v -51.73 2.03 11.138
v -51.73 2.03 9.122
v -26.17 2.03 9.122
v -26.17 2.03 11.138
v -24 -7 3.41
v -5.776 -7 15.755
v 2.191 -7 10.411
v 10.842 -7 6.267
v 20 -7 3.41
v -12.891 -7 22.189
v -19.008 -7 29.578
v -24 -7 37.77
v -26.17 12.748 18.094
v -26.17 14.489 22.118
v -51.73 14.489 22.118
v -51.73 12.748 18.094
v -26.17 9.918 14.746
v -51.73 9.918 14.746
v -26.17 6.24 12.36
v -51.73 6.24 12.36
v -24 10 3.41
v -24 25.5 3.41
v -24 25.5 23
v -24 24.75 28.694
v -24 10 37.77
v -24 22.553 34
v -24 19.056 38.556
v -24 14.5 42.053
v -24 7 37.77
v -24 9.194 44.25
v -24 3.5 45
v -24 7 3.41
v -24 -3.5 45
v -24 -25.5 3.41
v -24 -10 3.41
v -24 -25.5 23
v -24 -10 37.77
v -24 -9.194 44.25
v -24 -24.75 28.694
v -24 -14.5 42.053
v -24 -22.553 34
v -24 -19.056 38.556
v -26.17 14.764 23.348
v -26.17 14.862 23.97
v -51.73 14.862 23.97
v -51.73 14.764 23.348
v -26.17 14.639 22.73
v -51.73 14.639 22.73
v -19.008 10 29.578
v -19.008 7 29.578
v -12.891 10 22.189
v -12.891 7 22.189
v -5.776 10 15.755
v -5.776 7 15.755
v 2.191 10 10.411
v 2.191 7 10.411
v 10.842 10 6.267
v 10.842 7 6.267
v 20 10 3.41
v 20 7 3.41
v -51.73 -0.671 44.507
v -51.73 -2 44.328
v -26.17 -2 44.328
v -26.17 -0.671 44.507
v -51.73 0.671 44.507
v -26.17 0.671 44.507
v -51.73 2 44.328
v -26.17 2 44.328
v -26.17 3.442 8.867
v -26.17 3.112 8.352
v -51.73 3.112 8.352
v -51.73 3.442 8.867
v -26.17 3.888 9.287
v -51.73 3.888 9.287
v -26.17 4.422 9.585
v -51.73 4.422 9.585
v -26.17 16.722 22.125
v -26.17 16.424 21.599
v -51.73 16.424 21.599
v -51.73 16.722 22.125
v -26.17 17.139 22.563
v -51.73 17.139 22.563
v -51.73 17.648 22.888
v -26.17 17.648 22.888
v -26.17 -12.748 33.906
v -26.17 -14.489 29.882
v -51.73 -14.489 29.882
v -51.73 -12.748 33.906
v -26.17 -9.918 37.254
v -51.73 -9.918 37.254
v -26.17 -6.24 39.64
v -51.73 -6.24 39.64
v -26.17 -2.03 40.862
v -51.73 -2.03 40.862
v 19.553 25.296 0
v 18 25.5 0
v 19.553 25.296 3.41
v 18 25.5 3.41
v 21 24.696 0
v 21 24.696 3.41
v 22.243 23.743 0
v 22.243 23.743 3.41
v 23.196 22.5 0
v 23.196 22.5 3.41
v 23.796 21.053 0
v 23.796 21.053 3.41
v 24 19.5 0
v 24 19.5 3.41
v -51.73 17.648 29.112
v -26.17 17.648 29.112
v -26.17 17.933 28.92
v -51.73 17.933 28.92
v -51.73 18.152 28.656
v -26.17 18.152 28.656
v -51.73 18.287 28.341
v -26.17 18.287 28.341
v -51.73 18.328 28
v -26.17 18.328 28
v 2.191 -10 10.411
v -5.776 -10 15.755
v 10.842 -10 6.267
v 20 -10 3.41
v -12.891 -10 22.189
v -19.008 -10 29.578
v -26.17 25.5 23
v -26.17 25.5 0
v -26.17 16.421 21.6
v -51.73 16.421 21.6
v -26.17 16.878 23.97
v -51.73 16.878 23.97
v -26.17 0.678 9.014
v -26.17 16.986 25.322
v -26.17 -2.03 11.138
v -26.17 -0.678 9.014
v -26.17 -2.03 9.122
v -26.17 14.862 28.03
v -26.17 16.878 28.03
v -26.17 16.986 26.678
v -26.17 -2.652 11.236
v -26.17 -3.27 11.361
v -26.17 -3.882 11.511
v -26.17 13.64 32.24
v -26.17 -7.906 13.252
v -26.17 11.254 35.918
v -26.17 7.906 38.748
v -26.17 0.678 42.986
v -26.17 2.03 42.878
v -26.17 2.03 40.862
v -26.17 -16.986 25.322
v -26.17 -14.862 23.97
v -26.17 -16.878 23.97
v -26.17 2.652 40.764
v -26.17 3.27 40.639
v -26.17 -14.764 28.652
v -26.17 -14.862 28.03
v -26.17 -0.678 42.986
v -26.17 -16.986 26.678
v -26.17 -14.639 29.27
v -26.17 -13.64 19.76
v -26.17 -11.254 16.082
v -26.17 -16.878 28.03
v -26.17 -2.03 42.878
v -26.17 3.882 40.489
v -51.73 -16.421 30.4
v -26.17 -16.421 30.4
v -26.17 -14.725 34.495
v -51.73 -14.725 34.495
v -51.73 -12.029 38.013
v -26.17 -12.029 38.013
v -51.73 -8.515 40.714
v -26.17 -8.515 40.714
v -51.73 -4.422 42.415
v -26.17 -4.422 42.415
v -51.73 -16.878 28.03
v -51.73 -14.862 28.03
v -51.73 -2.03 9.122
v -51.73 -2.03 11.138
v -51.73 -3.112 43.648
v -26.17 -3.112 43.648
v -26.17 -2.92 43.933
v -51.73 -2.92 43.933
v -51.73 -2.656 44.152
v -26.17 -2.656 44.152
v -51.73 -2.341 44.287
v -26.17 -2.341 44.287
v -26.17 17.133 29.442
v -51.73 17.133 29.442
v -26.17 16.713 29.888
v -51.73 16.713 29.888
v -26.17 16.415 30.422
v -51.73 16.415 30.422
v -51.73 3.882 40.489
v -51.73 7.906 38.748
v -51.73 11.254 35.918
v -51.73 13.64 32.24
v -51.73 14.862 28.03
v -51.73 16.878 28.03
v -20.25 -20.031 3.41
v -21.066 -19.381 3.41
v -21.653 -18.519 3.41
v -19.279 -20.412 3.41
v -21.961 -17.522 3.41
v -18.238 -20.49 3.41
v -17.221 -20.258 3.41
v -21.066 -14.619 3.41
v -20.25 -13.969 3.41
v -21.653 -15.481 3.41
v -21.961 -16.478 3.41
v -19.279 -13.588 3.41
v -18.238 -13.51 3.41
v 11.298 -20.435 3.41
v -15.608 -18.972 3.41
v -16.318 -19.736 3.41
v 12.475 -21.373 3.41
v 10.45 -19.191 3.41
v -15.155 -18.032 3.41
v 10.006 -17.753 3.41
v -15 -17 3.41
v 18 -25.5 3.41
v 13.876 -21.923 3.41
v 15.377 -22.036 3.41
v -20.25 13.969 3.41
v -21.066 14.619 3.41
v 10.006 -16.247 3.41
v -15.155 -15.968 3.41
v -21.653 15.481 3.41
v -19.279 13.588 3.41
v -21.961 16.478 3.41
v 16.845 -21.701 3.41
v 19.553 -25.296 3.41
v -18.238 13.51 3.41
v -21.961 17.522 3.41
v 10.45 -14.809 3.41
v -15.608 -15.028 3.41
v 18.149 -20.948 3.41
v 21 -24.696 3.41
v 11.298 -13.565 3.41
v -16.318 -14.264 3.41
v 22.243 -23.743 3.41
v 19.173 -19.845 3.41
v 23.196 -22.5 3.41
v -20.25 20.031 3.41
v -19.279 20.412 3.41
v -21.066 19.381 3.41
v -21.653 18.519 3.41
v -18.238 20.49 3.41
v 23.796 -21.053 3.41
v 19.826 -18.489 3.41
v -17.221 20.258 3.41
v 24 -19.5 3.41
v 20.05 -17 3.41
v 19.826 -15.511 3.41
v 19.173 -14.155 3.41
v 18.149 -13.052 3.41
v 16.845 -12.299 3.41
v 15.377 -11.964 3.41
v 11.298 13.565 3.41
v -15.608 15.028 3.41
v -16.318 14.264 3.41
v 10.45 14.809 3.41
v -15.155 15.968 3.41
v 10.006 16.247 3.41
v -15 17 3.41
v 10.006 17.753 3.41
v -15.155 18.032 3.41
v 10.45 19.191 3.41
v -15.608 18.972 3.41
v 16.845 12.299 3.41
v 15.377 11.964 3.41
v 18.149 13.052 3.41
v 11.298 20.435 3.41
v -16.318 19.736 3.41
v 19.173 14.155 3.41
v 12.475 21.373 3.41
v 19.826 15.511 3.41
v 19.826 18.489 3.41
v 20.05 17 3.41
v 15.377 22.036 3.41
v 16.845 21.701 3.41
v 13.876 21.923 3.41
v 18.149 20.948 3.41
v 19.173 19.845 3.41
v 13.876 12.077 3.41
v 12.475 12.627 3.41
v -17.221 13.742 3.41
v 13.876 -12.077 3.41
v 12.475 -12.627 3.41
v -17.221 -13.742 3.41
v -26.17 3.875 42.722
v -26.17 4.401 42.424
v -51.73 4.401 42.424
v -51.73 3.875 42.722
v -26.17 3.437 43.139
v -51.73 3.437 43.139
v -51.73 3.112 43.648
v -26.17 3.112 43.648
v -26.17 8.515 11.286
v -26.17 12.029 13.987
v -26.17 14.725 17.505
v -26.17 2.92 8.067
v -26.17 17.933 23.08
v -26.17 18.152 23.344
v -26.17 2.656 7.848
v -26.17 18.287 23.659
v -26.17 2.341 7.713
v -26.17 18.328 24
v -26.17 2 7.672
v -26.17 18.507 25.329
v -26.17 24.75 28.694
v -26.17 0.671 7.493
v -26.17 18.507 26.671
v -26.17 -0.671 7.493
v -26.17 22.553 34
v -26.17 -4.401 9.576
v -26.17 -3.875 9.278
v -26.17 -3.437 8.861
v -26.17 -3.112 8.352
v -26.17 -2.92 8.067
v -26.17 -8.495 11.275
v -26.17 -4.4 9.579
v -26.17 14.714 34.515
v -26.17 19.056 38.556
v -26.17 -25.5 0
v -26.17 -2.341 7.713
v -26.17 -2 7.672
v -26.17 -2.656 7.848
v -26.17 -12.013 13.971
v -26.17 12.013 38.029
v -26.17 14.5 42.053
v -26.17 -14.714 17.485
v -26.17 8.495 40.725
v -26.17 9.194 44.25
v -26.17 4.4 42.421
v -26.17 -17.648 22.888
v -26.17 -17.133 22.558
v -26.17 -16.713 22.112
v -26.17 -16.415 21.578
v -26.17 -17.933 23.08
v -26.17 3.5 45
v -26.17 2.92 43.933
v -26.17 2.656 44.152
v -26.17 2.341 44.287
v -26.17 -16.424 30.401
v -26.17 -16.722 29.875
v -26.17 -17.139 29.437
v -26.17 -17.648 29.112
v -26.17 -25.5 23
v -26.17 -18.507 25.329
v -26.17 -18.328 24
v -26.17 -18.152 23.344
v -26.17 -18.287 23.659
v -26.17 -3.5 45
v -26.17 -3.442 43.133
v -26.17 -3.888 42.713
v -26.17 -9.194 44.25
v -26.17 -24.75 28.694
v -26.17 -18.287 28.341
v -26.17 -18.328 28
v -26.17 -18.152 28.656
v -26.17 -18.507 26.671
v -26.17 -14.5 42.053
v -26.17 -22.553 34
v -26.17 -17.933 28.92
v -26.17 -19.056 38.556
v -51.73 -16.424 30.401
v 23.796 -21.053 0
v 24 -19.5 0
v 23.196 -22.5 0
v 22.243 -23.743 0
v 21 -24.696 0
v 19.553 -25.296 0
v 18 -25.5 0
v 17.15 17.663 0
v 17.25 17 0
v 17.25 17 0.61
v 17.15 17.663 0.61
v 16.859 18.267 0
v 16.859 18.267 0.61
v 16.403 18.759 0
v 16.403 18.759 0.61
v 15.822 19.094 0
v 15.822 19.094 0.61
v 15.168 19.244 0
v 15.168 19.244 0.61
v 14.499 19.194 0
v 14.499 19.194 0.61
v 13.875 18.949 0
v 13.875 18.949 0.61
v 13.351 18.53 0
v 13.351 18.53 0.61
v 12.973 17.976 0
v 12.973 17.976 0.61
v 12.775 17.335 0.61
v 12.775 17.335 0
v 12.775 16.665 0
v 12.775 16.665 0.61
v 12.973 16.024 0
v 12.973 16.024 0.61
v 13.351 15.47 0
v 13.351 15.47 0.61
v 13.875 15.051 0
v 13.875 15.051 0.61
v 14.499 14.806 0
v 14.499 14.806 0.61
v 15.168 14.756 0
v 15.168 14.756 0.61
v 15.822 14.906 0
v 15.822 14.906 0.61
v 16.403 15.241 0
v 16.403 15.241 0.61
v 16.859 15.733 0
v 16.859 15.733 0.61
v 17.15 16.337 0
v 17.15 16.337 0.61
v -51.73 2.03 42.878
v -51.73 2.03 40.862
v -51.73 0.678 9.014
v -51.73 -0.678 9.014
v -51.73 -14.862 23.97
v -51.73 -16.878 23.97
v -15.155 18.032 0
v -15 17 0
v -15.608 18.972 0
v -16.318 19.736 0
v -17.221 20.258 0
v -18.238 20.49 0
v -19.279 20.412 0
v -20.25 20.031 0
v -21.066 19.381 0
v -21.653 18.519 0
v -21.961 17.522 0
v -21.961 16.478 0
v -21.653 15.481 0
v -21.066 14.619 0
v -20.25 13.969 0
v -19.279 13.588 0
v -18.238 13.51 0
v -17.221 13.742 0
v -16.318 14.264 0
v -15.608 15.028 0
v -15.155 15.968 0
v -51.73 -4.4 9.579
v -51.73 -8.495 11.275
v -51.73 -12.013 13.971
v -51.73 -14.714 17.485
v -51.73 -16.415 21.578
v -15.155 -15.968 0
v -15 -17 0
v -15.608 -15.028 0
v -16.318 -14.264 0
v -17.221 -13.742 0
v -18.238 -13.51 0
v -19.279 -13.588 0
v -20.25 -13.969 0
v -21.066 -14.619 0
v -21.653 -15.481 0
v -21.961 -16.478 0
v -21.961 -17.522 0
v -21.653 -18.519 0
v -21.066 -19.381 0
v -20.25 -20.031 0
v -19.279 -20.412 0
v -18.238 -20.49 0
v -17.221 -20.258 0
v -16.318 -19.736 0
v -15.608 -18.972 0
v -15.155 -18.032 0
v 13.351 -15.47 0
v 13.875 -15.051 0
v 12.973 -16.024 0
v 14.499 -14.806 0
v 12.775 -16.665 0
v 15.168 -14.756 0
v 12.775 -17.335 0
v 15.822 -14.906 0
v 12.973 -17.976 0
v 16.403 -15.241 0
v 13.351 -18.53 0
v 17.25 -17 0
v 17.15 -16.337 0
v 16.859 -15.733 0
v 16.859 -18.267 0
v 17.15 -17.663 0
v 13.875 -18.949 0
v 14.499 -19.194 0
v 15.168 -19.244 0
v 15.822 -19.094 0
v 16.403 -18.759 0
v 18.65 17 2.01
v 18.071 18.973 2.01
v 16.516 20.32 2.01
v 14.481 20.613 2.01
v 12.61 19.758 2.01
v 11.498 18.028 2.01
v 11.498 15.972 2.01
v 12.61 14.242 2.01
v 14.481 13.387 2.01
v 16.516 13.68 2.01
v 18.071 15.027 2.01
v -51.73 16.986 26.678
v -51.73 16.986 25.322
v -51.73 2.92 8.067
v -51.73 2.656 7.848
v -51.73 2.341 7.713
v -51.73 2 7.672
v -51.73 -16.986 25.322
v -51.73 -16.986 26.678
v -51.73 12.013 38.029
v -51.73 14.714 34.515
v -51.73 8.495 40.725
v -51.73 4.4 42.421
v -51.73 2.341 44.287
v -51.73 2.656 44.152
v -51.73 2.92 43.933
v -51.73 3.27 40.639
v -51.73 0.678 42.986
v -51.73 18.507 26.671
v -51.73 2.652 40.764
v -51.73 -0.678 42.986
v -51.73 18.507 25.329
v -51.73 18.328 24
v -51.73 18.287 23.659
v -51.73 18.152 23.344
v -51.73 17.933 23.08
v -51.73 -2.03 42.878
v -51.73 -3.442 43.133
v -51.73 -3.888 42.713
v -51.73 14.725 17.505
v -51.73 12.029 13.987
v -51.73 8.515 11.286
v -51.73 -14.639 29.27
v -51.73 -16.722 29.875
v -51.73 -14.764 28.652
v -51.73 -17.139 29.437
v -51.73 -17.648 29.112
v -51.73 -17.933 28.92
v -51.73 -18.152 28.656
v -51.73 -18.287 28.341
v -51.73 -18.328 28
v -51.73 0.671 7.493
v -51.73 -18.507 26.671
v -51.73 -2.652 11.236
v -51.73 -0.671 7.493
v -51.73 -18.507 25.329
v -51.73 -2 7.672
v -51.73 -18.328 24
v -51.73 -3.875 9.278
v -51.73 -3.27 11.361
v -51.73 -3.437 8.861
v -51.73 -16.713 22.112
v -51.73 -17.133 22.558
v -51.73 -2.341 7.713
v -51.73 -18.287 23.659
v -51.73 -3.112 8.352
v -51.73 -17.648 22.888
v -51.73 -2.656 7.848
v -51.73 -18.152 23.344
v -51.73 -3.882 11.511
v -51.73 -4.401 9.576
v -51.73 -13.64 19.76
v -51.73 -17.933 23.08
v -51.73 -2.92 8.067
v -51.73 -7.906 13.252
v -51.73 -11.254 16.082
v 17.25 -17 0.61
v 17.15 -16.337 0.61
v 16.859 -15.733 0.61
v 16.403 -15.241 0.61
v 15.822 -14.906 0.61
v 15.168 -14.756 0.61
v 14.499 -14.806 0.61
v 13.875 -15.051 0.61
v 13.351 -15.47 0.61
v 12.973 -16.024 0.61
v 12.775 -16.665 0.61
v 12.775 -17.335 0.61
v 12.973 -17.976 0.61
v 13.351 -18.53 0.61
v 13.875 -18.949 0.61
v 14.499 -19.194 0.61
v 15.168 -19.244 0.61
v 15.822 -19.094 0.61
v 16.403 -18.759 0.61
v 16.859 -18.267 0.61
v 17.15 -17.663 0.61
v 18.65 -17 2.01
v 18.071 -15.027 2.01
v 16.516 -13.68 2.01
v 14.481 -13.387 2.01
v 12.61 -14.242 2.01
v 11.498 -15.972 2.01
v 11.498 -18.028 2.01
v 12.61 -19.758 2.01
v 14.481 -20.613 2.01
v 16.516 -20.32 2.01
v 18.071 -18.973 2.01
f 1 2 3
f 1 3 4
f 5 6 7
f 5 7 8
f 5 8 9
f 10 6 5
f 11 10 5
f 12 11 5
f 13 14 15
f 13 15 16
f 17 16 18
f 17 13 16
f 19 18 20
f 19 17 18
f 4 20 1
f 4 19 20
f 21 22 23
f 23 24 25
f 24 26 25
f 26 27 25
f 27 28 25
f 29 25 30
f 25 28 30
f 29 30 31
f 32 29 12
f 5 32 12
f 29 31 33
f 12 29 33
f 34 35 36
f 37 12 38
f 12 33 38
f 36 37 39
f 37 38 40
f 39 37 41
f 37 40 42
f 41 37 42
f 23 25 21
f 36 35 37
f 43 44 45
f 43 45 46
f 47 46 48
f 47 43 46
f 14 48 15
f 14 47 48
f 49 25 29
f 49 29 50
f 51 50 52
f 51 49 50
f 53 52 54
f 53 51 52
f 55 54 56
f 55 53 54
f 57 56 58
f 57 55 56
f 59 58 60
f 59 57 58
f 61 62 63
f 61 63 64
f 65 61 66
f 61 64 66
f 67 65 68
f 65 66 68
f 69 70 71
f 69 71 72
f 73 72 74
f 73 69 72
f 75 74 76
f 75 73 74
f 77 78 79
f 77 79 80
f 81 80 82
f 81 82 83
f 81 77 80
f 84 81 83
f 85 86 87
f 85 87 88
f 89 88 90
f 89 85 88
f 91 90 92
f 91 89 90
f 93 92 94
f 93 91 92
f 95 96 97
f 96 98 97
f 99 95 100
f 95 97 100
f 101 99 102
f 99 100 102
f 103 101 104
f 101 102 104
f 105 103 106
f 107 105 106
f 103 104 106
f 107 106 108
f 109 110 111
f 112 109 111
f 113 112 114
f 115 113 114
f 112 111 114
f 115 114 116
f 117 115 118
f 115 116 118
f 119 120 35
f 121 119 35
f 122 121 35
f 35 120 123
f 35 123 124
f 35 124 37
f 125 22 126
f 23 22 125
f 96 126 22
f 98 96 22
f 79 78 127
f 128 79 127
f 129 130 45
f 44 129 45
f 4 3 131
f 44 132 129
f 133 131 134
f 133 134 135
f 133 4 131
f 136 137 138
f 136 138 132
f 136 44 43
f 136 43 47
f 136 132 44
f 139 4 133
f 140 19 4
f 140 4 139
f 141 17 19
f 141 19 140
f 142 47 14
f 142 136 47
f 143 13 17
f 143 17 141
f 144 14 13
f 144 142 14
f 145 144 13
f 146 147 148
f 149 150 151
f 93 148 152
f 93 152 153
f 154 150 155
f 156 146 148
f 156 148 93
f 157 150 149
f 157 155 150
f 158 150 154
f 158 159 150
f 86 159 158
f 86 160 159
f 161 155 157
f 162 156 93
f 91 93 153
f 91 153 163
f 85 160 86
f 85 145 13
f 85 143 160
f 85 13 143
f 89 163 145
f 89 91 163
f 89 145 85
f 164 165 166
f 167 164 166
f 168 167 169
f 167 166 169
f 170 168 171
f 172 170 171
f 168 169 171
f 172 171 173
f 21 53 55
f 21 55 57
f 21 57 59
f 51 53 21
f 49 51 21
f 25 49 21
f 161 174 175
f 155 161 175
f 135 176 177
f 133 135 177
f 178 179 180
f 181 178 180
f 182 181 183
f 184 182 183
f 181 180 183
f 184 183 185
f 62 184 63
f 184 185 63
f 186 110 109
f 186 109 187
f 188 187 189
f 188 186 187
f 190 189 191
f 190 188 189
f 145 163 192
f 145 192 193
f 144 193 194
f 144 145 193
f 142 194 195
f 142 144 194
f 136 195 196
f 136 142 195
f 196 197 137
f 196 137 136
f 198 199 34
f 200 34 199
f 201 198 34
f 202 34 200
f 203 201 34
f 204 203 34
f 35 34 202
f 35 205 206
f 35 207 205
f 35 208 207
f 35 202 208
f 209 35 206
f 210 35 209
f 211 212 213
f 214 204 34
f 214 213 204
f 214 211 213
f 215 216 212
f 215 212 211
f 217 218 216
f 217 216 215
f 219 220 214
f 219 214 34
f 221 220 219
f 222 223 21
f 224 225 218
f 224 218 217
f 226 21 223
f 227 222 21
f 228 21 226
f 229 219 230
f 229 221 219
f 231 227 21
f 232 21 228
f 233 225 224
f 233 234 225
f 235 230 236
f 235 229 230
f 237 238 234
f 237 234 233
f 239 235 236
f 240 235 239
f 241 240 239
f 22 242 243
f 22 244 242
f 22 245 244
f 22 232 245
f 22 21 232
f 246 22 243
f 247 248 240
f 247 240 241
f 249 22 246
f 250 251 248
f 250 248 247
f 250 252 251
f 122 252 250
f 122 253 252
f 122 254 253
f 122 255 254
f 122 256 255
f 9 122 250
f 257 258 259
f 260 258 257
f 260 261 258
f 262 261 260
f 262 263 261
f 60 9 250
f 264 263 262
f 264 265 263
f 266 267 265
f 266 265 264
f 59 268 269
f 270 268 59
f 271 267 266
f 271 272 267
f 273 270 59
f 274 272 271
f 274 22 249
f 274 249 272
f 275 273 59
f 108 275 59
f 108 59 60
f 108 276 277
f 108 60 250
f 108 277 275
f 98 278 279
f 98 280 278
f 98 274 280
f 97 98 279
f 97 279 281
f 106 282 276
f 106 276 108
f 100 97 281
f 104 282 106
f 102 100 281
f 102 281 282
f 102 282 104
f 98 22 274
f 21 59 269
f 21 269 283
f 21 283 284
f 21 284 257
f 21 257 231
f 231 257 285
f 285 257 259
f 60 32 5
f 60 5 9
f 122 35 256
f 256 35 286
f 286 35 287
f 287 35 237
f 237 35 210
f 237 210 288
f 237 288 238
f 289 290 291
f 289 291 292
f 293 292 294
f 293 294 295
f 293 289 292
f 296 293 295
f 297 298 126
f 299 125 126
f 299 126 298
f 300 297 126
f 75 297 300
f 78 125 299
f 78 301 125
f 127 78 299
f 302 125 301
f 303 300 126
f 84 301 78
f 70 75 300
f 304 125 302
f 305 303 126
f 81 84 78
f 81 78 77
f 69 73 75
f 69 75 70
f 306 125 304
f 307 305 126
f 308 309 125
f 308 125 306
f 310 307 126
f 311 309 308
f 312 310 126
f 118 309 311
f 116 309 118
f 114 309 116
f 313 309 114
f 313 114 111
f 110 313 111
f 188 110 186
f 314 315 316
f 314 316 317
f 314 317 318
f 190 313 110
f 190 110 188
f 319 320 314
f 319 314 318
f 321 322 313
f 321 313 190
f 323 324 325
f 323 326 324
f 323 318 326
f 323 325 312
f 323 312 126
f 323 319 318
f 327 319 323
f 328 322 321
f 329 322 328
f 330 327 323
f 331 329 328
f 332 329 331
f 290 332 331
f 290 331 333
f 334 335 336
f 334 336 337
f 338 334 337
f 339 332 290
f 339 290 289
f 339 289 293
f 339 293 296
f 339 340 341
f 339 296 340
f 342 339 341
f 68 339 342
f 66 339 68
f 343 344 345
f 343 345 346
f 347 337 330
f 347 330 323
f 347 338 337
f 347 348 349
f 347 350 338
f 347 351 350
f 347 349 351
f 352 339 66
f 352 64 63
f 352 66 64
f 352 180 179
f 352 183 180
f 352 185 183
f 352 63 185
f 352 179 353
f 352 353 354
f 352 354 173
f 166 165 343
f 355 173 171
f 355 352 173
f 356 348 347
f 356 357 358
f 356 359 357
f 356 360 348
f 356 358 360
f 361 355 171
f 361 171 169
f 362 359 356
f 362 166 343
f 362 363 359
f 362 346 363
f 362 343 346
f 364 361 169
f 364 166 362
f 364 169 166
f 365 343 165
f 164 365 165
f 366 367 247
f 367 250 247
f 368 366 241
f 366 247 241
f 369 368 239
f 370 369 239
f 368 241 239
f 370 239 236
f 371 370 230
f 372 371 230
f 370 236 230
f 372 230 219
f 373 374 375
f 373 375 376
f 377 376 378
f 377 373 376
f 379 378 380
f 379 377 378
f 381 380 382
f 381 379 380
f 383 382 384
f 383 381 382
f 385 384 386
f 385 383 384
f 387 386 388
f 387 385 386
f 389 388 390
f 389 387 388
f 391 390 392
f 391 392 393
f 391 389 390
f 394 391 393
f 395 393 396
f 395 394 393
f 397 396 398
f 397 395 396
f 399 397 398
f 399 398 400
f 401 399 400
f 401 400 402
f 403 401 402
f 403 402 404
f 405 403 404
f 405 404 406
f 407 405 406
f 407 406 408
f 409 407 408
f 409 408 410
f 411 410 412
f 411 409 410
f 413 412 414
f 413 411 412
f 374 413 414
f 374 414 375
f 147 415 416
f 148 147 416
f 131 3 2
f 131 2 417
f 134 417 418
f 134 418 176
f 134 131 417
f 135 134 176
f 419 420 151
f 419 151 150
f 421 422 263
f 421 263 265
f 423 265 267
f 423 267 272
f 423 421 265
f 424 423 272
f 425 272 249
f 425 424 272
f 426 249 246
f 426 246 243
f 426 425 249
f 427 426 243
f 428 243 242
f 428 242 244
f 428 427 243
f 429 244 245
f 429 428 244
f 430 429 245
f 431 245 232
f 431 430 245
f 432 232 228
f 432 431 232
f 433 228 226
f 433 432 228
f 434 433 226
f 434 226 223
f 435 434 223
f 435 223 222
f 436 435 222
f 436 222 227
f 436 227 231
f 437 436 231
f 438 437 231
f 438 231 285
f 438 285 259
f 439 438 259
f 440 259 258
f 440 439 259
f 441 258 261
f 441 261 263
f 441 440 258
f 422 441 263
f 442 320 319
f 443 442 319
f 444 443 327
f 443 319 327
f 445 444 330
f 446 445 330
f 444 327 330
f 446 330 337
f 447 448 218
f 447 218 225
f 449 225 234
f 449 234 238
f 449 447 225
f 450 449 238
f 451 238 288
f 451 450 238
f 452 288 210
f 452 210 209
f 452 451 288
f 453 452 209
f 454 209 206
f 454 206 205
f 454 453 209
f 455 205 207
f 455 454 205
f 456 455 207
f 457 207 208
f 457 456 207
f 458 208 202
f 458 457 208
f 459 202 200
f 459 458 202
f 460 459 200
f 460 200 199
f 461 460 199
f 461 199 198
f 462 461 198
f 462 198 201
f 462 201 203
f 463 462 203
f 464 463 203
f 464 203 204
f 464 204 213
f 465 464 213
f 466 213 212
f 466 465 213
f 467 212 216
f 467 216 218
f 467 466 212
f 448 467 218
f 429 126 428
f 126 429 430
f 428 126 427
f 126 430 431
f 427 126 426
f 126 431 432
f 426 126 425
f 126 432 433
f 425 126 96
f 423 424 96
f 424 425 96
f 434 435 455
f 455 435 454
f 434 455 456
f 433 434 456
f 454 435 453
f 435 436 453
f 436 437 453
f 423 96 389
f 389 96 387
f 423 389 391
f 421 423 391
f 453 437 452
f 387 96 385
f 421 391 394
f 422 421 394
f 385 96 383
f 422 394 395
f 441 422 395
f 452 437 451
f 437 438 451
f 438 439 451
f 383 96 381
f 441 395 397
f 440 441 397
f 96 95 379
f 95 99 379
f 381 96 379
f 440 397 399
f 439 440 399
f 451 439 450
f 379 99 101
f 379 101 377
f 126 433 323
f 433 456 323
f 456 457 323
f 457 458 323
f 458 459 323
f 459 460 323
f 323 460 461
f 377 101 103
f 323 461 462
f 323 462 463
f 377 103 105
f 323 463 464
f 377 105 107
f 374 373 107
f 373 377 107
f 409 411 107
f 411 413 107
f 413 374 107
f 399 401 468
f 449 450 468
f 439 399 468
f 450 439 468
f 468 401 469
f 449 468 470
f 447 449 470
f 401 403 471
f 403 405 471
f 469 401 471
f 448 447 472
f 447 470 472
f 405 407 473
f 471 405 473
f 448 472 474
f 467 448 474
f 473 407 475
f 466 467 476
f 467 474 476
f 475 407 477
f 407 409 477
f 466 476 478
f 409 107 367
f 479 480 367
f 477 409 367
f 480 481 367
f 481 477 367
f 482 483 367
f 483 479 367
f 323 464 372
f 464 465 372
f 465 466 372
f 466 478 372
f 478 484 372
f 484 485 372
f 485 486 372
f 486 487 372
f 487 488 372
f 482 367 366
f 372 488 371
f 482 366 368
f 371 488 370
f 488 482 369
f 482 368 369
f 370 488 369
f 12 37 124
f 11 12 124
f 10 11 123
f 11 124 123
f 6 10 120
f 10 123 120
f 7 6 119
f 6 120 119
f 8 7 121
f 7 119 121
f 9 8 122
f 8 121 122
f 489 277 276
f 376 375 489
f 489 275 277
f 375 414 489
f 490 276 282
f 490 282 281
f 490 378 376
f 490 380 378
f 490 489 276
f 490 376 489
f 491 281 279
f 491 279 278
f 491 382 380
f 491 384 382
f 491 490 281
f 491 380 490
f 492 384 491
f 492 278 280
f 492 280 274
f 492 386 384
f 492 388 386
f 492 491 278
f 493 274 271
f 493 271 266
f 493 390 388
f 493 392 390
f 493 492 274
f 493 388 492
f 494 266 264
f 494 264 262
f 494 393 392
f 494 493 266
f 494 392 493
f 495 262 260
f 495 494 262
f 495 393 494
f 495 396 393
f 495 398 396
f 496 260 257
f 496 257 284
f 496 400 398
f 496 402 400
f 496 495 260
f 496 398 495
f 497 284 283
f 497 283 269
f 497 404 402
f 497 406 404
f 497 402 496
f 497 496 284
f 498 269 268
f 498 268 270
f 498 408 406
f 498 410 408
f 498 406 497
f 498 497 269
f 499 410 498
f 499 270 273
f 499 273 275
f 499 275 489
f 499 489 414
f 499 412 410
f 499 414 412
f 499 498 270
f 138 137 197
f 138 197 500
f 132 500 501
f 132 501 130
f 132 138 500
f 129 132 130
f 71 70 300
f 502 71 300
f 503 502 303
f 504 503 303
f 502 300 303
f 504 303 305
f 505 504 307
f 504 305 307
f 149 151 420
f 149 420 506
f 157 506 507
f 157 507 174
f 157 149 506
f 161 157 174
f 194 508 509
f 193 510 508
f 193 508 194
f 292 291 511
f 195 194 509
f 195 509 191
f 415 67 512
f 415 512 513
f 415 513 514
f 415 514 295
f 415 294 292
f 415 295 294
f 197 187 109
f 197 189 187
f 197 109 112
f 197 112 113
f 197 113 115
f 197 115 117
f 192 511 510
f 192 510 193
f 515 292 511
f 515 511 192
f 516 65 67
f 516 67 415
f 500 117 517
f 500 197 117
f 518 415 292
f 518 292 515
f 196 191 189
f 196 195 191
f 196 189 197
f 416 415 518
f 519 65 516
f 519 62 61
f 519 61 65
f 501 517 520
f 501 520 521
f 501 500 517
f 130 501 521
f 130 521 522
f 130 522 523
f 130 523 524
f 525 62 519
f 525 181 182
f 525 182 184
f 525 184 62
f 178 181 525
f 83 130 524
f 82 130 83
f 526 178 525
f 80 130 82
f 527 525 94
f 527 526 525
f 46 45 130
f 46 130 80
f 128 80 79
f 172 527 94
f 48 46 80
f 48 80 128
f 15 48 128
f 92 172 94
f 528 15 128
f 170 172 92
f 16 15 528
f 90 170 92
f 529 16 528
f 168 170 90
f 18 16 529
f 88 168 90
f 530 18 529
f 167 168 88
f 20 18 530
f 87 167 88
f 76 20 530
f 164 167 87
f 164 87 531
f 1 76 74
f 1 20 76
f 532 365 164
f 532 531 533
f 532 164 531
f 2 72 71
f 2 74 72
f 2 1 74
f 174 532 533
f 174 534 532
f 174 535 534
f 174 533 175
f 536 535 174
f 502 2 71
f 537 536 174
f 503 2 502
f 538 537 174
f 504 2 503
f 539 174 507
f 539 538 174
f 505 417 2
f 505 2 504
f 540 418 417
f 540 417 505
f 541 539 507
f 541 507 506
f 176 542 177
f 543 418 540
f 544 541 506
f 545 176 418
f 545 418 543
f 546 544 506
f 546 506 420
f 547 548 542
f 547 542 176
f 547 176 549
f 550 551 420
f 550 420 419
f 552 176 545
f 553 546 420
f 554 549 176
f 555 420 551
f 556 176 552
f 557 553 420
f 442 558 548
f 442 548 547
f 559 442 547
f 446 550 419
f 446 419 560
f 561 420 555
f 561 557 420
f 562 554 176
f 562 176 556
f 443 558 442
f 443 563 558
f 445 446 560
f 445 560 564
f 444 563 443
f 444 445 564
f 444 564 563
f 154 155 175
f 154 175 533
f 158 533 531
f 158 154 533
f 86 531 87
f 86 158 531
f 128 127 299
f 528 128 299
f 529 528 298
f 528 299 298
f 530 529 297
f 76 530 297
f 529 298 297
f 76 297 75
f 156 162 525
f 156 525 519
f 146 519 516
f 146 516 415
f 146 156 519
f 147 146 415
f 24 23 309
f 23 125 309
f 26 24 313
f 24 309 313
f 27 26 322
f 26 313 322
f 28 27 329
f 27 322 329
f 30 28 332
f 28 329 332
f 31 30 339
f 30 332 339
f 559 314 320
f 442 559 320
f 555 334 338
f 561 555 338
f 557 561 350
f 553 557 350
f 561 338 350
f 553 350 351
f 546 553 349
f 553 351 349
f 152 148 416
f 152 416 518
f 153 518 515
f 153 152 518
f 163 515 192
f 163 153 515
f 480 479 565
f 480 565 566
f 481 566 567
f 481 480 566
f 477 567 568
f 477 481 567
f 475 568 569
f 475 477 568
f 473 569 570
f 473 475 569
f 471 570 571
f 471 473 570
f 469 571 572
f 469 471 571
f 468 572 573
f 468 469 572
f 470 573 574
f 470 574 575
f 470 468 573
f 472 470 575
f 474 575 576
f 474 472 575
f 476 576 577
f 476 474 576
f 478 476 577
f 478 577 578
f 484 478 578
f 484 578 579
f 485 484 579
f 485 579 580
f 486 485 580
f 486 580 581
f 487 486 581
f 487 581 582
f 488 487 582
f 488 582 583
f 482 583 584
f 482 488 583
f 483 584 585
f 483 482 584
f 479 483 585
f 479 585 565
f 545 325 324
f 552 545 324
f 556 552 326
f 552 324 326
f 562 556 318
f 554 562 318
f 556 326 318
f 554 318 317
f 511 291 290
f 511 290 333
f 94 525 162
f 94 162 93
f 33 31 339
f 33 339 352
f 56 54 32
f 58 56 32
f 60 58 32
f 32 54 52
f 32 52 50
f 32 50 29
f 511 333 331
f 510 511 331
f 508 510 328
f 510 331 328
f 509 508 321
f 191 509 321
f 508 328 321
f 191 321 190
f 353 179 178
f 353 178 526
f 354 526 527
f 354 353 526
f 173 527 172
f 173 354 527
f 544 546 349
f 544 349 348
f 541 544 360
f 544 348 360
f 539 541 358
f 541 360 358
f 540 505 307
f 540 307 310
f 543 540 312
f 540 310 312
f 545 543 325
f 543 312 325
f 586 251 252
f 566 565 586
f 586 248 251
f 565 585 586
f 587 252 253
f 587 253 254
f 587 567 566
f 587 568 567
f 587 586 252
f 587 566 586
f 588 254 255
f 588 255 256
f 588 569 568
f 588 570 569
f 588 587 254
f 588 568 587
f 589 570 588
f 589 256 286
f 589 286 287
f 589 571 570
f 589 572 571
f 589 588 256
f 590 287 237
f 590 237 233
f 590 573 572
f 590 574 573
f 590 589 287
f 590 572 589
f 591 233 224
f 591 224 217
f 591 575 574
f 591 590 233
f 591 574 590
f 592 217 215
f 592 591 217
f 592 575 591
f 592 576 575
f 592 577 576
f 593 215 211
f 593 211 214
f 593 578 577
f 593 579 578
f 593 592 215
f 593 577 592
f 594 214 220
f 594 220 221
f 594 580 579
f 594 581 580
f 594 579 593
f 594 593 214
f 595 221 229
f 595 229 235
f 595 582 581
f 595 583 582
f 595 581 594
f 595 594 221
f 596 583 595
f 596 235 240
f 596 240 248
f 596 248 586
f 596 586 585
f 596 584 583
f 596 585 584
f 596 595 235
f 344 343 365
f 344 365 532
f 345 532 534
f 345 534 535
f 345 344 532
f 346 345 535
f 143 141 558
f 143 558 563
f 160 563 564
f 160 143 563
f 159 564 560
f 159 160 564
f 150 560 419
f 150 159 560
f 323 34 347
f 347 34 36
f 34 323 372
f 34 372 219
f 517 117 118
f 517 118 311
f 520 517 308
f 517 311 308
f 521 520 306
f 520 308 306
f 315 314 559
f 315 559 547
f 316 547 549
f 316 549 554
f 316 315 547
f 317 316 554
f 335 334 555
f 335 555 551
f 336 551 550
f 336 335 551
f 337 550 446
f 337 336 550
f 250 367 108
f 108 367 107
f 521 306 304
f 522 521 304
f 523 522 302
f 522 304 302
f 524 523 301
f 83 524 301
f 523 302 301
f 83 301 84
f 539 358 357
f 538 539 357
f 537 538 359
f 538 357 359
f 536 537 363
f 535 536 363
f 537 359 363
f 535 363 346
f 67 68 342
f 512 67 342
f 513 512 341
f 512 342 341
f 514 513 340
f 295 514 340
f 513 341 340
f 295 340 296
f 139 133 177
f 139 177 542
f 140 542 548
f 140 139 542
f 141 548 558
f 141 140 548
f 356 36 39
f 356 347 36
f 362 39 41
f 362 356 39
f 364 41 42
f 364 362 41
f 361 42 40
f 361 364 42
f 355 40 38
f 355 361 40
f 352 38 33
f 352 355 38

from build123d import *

# Parameters (mm, degrees)
SKETCH001_W        = 48
SKETCH001_H        = 51
SKETCH001_R        = 3.5
SKETCH001_R_2      = 2.25
PAD_DEPTH          = 3.41
SKETCH002_W        = 51
SKETCH002_H        = 45
PAD001_DEPTH       = 2.17
PAD002_DEPTH       = 25.56
POLARPATTERN_COUNT = 4
PAD003_DEPTH       = 3
CHAMFER_SIZE       = 2.8
FILLET_R           = 6
FILLET001_R        = 22


with BuildPart() as part:
    # Sketch001 → Pad (new body)
    with BuildSketch(Plane.XY):
        Rectangle(SKETCH001_W, SKETCH001_H)
        with Locations((-18.5, 17)):
            Circle(SKETCH001_R, mode=Mode.SUBTRACT)
        with Locations((15, 17)):
            Circle(SKETCH001_R_2, mode=Mode.SUBTRACT)
        with Locations((-18.5, -17)):
            Circle(SKETCH001_R, mode=Mode.SUBTRACT)
        with Locations((15, -17)):
            Circle(SKETCH001_R_2, mode=Mode.SUBTRACT)
    extrude(amount=PAD_DEPTH)

    # Sketch002 → Pad001 (join)
    with BuildSketch(Plane(origin=(-24, 0, 0), x_dir=(0, -1, 0), z_dir=(-1, 0, 0))):
        with Locations((0, 22.5)):
            Rectangle(SKETCH002_W, SKETCH002_H)
    extrude(amount=PAD001_DEPTH)

    # Sketch → Pad002 (join)
    with BuildSketch(Plane(origin=(-26.17, 0, 26), x_dir=(0, -1, 0), z_dir=(-1, 0, 0))):
        with BuildLine():
            ThreePointArc((16.420739, 4.399924), (12.028925, 12.0127), (4.422085, 16.414785))
            ThreePointArc((3.11174, 17.647793), (3.652144, 16.909322), (4.422085, 16.414785))
            ThreePointArc((3.11174, 17.647793), (2.656255, 18.151957), (2, 18.327959))
            ThreePointArc((2, 18.327959), (0, 18.53), (-2, 18.327959))
            ThreePointArc((-2, 18.327959), (-2.656255, 18.151957), (-3.11174, 17.647793))
            ThreePointArc((-4.400695, 16.423616), (-3.643735, 16.917271), (-3.11174, 17.647793))
            Line((-4.400695, 16.423616), (-3.882286, 14.488887))
            ThreePointArc((-2.03, 14.862002), (-2.962024, 14.704639), (-3.882286, 14.488887))
            Line((-2.03, 16.878362), (-2.03, 14.862002))
            ThreePointArc((2.03, 16.878362), (0, 17), (-2.03, 16.878362))
            Line((2.03, 16.878362), (2.03, 14.862002))
            ThreePointArc((14.488887, 3.882286), (9.917507, 11.253579), (2.03, 14.862002))
            Line((14.488887, 3.882286), (16.420739, 4.399924))
        make_face()
    pad002 = extrude(amount=PAD002_DEPTH)

    # PolarPattern: Pad002 ×4 about axis
    polarpattern_axis = Axis((-26.17, 0, 26), (-1, 0, 0))
    for i in range(1, POLARPATTERN_COUNT):
        add(pad002.rotate(polarpattern_axis, i * 360 / POLARPATTERN_COUNT))

    # Sketch003 → Pad003 (join)
    with BuildSketch(Plane.XZ.offset(-10)):
        with BuildLine():
            ThreePointArc((-24, 37.77), (-5.775752, 15.754927), (20, 3.41))
            Line((20, 3.41), (-24, 3.41))
            Line((-24, 3.41), (-24, 37.77))
        make_face()
    pad003 = extrude(amount=PAD003_DEPTH)

    # Mirrored: Pad003 across XZ
    add(pad003.mirror(Plane.XZ))

    # Chamfer
    chamfer_edges = [part.edges().sort_by_distance(p)[0] for p in [
        (12.75, 17, 3.41),
        (12.75, -17, 3.41),
    ]]
    chamfer(chamfer_edges, length=CHAMFER_SIZE)

    # Fillet
    fillet_edges = [part.edges().sort_by_distance(p)[0] for p in [
        (24, 25.5, 1.705),
        (24, -25.5, 1.705),
    ]]
    fillet(fillet_edges, radius=FILLET_R)

    # Fillet001
    fillet001_edges = [part.edges().sort_by_distance(p)[0] for p in [
        (-25.085, 25.5, 45),
        (-25.085, -25.5, 45),
    ]]
    fillet(fillet001_edges, radius=FILLET001_R)


solid = part.part
